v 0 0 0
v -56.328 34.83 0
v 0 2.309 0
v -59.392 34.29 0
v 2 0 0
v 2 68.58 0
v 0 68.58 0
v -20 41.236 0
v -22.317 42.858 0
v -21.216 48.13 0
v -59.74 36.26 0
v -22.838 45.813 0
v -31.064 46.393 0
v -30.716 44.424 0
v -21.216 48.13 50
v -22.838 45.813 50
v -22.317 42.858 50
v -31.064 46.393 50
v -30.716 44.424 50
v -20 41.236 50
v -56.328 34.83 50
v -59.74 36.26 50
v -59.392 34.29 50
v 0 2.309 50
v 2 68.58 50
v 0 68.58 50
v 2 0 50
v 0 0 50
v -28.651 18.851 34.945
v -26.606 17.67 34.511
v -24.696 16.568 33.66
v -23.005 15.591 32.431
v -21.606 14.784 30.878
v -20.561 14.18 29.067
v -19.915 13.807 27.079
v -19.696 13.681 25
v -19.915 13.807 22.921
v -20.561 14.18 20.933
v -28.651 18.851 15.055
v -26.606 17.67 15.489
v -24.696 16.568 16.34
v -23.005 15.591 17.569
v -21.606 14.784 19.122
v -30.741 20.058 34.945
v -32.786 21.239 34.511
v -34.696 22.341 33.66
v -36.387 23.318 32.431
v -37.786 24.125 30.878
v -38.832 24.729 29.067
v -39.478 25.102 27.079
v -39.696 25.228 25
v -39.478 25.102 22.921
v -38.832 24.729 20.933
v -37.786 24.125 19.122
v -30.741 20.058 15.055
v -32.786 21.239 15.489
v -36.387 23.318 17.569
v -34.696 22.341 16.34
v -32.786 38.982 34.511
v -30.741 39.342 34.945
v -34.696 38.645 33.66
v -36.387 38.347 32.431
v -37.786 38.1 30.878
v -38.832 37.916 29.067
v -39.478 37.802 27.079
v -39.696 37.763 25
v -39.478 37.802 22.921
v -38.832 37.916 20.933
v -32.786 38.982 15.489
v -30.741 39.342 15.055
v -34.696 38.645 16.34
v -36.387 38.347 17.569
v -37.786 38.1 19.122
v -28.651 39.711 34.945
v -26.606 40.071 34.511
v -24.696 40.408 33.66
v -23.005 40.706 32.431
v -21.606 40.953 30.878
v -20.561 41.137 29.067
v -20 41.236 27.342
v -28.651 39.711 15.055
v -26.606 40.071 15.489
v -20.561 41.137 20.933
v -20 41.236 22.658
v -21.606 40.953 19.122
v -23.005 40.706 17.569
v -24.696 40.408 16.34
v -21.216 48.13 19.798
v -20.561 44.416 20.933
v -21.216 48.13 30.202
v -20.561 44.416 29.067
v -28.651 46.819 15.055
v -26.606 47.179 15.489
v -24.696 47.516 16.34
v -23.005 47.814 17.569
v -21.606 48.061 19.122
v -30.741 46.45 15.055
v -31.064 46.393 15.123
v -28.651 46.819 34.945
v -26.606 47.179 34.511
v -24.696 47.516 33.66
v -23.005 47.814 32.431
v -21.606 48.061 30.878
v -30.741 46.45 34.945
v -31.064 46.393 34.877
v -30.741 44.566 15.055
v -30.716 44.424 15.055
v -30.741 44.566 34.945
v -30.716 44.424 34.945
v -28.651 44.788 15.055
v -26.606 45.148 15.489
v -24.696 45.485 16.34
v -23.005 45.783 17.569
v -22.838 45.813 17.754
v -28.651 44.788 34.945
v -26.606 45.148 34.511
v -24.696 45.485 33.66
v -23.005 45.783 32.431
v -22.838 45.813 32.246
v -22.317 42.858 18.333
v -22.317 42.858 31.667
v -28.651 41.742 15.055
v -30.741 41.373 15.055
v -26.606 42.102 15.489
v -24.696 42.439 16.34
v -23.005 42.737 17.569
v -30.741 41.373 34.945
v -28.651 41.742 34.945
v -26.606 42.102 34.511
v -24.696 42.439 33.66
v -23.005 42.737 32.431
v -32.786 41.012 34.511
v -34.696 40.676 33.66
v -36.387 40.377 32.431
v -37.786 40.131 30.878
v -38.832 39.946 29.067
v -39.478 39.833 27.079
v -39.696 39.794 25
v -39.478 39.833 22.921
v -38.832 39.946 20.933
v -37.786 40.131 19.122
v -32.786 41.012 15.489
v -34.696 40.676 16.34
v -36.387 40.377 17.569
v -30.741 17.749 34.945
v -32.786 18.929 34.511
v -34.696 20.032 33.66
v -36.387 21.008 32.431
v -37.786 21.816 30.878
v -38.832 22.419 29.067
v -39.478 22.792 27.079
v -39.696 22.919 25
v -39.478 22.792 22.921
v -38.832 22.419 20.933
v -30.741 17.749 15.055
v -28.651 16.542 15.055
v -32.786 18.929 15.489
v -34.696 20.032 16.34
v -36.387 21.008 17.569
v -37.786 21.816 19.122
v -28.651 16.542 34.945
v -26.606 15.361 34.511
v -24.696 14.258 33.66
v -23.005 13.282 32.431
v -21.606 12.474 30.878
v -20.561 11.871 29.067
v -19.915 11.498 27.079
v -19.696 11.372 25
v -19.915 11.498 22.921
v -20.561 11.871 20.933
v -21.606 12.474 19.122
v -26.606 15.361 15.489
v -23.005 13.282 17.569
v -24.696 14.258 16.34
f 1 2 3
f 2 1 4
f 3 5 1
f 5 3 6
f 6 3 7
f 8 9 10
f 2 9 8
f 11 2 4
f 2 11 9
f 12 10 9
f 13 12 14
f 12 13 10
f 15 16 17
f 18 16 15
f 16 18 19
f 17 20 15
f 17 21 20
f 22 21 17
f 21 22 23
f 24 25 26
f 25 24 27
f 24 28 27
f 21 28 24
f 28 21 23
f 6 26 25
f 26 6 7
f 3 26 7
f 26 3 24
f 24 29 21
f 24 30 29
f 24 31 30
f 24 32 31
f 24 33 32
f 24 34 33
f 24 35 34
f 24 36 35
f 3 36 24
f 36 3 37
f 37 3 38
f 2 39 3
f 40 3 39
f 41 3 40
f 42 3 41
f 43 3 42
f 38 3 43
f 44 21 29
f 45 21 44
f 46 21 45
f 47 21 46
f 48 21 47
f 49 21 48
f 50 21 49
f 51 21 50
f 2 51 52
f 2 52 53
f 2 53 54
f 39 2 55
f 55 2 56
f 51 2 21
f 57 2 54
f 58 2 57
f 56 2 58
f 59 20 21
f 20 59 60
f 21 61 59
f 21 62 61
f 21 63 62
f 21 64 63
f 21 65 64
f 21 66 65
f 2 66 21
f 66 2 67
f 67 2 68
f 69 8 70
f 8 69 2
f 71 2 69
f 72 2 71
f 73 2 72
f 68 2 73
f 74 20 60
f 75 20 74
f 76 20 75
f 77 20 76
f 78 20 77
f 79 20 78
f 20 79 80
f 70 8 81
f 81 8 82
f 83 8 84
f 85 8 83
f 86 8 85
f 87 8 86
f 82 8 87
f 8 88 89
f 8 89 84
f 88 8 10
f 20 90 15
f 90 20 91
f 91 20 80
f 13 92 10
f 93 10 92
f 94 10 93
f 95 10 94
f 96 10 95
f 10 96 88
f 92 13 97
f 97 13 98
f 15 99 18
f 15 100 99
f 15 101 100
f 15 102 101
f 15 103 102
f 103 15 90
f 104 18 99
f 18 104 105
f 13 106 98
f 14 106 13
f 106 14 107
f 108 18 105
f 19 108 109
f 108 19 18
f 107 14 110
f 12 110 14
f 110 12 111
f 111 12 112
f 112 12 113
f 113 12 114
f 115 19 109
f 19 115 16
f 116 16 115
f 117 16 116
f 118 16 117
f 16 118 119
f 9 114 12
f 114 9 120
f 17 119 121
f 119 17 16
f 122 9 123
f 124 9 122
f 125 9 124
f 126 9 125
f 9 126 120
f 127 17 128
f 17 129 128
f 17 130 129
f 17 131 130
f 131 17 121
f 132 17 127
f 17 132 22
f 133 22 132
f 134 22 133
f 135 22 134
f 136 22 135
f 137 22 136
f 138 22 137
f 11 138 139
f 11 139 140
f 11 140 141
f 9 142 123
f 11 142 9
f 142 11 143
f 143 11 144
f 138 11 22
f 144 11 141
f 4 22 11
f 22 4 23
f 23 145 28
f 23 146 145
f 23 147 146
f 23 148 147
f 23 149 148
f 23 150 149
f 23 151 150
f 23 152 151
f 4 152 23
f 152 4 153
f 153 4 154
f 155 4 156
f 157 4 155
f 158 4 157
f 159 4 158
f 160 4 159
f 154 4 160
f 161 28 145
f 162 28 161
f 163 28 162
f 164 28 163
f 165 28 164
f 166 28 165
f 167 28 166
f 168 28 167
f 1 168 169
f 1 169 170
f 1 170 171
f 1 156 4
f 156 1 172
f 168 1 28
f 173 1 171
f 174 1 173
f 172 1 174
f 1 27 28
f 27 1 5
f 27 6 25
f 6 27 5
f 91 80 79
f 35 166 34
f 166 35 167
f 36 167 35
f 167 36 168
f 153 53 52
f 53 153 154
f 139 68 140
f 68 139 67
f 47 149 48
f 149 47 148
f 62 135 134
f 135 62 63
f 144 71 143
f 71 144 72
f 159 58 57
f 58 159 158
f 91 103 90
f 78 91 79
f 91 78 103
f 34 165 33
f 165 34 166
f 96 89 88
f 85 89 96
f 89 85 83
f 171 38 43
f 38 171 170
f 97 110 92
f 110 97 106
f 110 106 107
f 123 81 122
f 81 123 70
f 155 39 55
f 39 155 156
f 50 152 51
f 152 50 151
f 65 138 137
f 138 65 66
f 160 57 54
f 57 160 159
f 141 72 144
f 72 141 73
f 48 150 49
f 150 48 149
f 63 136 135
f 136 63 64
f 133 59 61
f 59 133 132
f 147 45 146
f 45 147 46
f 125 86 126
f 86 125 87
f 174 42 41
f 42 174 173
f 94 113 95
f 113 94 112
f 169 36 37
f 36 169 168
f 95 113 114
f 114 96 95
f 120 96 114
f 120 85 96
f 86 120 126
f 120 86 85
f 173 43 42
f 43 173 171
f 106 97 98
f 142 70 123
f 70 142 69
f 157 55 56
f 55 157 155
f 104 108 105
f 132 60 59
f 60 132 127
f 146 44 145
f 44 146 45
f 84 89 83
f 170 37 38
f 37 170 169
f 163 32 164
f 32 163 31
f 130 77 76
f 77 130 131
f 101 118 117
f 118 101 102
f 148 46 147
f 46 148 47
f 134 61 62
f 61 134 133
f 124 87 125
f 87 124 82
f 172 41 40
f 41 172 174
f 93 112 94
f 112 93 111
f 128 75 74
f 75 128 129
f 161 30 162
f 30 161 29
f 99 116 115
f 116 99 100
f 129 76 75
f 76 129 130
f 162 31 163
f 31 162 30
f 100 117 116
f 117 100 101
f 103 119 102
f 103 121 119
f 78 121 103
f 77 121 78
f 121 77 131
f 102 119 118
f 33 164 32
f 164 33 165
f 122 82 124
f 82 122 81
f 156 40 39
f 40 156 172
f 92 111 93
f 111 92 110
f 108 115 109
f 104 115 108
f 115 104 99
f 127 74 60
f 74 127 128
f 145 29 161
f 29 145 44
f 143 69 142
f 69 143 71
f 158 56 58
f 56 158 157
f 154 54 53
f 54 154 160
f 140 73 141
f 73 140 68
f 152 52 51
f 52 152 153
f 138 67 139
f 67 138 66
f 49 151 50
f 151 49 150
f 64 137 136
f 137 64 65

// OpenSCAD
//!OpenSCAD
// diameter of the cutout hole in mm
Hole_Diameter = 10;
//width of the holder in mm
width = 50;
// length of the two holders in mm
Phone_grabber_length = 10;
// thicknessof your phone/tablet + a tolerance in mm
Phone_thickness = 5;
// length of your plug + lenth of the cable with the curve in mm
Plug_length = 20;
// length of the holder wich you phoneleads on in mm
Holder_length = 40;
// angle ofthe rear holder
Angle = 60;
//angle of the phone
Phone_Angle = 100;
//overall materialthickness in mm
Material_thickness = 2;
Side_length = (sin(Phone_Angle) * (Holder_length * 1) + Plug_length) / sin(Angle);
difference() {
  linear_extrude( height=width, twist=0, scale=[1, 1], center=false){
    union(){
      square([Material_thickness, Side_length], center=false);
      rotate([0, 0, Angle]){
        square([Material_thickness, Side_length], center=false);
      }
      translate([(sin(Angle) * (Side_length * -1) - sin(Phone_Angle) * (Holder_length * -1)), (cos(Angle) * Side_length + cos(Phone_Angle) * (Holder_length * -1)), 0]){
        rotate([0, 0, Phone_Angle]){
          union(){
            square([Material_thickness, Holder_length], center=false);
            union(){
              translate([Phone_thickness, 0, 0]){
                rotate([0, 0, 90]){
                  square([Material_thickness, Phone_thickness], center=false);
                }
              }
              translate([(Phone_thickness * 1), (Material_thickness * 0), 0]){
                rotate([0, 0, 0]){
                  square([Material_thickness, Phone_grabber_length], center=false);
                }
              }
            }
          }
        }
      }
    }
  }

  translate([((sin(Phone_Angle) * (Holder_length * 1) + Plug_length) / -2), 0, (width / 2)]){
    rotate([90, 0, 0]){
      cylinder(r=Hole_Diameter, r=Hole_Diameter, h=20000, center=true);
    }
  }
}
